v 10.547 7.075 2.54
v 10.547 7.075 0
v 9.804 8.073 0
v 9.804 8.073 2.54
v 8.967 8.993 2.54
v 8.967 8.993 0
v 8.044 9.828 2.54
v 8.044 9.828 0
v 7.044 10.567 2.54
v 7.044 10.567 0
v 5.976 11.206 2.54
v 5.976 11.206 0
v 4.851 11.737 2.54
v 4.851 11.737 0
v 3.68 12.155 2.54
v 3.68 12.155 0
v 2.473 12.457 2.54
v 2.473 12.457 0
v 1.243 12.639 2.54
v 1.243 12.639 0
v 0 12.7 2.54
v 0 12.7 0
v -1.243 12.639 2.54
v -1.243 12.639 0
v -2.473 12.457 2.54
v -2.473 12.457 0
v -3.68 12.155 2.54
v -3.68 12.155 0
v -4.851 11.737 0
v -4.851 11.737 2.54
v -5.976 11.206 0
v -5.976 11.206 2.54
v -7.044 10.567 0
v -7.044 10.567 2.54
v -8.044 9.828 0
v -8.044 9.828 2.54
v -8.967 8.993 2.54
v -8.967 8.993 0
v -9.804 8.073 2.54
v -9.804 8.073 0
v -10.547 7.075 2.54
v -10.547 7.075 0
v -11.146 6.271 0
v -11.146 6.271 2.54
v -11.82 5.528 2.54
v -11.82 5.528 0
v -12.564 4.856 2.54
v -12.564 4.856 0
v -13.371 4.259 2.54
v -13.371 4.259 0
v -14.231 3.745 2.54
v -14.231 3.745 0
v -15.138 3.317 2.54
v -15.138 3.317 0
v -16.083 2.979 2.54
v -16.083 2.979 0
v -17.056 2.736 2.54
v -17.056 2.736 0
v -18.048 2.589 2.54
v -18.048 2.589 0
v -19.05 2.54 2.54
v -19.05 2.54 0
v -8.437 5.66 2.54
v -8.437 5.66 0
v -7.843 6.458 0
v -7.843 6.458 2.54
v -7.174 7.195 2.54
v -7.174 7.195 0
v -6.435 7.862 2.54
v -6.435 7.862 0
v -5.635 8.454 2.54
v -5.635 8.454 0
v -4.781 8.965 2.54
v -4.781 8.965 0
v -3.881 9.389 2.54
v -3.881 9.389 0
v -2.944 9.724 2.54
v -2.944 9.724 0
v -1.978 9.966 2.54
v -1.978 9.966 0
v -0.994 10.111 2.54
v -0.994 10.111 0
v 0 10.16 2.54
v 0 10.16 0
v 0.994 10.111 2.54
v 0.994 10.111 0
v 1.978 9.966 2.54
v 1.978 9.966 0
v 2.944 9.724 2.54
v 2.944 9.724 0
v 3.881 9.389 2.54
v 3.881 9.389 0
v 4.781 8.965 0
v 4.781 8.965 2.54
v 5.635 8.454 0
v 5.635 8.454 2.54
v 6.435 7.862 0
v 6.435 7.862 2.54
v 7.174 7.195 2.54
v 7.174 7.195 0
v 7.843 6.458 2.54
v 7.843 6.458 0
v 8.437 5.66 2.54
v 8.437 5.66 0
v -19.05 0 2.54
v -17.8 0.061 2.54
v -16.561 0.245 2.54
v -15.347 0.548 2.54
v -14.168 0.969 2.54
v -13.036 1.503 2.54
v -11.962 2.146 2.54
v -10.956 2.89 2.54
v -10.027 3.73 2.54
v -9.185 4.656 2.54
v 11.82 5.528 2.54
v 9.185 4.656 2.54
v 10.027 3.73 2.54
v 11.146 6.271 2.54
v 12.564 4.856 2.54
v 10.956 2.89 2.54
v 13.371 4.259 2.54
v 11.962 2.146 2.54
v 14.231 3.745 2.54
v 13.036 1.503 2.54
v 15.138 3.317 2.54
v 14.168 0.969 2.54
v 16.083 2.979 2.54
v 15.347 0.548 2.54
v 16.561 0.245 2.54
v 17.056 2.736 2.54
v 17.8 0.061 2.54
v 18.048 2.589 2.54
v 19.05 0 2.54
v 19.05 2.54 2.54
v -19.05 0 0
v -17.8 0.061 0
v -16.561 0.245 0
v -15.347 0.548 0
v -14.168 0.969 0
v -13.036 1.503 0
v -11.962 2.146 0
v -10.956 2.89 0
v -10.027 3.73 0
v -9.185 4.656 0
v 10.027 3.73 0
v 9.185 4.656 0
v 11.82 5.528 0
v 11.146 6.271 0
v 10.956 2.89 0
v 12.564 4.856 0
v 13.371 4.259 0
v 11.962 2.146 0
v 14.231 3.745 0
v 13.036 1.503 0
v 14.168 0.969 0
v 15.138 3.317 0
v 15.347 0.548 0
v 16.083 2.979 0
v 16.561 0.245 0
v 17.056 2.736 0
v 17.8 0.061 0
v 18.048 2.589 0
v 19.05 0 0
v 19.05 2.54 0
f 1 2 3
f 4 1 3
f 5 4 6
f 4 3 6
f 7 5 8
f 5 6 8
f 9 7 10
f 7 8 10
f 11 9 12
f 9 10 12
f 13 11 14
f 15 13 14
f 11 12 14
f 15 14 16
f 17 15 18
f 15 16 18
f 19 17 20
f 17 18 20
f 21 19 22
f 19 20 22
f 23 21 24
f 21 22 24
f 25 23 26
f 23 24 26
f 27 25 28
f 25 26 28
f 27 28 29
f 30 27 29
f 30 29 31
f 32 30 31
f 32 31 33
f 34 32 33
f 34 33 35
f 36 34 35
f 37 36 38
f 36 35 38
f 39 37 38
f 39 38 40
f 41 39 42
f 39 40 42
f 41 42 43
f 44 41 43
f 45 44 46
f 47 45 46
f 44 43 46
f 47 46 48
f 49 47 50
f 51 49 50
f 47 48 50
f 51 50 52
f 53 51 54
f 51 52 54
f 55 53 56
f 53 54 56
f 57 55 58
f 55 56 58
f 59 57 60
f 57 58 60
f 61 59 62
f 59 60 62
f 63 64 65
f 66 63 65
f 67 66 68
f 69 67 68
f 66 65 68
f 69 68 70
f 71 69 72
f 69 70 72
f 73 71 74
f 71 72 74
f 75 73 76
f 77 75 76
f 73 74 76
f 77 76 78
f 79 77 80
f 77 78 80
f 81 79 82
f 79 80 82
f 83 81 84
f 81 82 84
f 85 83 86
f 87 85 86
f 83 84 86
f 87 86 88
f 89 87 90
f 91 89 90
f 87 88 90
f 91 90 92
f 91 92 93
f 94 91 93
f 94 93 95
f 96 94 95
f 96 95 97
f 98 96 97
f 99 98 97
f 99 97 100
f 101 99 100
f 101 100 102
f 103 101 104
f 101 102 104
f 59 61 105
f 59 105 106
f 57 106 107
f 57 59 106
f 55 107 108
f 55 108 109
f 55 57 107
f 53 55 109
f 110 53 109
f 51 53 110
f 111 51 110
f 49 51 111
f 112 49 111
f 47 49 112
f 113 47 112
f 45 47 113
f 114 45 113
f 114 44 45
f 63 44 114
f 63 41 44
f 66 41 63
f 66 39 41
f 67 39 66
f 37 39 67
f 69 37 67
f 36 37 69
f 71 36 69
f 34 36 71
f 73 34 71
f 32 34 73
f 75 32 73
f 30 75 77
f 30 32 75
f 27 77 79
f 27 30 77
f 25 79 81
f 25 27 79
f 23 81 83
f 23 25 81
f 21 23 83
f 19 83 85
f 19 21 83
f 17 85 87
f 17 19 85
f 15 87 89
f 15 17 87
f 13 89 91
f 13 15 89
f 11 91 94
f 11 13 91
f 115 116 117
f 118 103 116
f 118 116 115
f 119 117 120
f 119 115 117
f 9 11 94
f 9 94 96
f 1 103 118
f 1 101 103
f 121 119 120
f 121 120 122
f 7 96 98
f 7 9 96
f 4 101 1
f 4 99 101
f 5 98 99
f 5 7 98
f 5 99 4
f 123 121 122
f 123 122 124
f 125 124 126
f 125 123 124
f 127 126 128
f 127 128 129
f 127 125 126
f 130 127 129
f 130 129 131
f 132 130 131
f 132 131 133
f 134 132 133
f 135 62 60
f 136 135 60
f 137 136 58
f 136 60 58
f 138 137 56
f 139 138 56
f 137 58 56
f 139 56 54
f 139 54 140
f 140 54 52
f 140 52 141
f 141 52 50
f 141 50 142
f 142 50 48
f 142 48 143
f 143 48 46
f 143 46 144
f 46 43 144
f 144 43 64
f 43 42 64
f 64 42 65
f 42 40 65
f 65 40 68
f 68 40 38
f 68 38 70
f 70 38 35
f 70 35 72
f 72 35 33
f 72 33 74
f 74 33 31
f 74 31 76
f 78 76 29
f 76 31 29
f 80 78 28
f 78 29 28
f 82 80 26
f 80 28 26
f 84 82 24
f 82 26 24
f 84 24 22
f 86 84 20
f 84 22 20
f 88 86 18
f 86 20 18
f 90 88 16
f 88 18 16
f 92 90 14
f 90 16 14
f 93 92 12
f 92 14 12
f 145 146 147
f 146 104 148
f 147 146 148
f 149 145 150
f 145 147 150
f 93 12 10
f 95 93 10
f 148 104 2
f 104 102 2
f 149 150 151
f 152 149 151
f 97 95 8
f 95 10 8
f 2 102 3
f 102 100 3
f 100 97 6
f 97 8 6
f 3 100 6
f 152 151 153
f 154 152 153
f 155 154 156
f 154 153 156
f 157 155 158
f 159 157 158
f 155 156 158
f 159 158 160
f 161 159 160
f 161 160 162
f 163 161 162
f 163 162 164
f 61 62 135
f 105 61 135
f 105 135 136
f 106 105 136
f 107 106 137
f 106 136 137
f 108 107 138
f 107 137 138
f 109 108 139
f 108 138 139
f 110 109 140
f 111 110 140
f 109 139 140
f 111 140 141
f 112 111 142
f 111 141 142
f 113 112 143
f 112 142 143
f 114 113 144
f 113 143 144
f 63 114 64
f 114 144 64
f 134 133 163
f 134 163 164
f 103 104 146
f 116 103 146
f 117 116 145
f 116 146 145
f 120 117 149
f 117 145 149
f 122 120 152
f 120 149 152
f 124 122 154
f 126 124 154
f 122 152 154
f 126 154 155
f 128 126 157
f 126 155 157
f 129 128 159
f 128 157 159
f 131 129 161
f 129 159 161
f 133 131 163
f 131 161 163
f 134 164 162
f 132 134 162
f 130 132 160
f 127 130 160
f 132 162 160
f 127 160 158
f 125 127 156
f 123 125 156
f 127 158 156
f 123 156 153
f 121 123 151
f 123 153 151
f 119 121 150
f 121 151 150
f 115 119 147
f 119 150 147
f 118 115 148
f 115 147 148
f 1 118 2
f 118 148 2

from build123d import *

# Parameters (mm, degrees)
F1_DEPTH = 2.54


with BuildPart() as f1:
    # F0 (on Top) → F1 (new body)
    with BuildSketch(Plane.XY):
        with BuildLine():
            ThreePointArc((-8.43737, 5.660069), (0, 10.16), (8.43737, 5.660069))
            ThreePointArc((8.43737, 5.660069), (13.036176, 1.503456), (19.05, 0))
            Line((19.05, 0), (19.05, 2.54))
            ThreePointArc((19.05, 2.54), (14.231471, 3.744632), (10.546713, 7.075087))
            ThreePointArc((10.546713, 7.075087), (0, 12.7), (-10.546713, 7.075087))
            ThreePointArc((-10.546713, 7.075087), (-14.231471, 3.744632), (-19.05, 2.54))
            Line((-19.05, 2.54), (-19.05, 0))
            ThreePointArc((-19.05, 0), (-13.036176, 1.503456), (-8.43737, 5.660069))
        make_face()
    extrude(amount=F1_DEPTH)


solid = f1.part
